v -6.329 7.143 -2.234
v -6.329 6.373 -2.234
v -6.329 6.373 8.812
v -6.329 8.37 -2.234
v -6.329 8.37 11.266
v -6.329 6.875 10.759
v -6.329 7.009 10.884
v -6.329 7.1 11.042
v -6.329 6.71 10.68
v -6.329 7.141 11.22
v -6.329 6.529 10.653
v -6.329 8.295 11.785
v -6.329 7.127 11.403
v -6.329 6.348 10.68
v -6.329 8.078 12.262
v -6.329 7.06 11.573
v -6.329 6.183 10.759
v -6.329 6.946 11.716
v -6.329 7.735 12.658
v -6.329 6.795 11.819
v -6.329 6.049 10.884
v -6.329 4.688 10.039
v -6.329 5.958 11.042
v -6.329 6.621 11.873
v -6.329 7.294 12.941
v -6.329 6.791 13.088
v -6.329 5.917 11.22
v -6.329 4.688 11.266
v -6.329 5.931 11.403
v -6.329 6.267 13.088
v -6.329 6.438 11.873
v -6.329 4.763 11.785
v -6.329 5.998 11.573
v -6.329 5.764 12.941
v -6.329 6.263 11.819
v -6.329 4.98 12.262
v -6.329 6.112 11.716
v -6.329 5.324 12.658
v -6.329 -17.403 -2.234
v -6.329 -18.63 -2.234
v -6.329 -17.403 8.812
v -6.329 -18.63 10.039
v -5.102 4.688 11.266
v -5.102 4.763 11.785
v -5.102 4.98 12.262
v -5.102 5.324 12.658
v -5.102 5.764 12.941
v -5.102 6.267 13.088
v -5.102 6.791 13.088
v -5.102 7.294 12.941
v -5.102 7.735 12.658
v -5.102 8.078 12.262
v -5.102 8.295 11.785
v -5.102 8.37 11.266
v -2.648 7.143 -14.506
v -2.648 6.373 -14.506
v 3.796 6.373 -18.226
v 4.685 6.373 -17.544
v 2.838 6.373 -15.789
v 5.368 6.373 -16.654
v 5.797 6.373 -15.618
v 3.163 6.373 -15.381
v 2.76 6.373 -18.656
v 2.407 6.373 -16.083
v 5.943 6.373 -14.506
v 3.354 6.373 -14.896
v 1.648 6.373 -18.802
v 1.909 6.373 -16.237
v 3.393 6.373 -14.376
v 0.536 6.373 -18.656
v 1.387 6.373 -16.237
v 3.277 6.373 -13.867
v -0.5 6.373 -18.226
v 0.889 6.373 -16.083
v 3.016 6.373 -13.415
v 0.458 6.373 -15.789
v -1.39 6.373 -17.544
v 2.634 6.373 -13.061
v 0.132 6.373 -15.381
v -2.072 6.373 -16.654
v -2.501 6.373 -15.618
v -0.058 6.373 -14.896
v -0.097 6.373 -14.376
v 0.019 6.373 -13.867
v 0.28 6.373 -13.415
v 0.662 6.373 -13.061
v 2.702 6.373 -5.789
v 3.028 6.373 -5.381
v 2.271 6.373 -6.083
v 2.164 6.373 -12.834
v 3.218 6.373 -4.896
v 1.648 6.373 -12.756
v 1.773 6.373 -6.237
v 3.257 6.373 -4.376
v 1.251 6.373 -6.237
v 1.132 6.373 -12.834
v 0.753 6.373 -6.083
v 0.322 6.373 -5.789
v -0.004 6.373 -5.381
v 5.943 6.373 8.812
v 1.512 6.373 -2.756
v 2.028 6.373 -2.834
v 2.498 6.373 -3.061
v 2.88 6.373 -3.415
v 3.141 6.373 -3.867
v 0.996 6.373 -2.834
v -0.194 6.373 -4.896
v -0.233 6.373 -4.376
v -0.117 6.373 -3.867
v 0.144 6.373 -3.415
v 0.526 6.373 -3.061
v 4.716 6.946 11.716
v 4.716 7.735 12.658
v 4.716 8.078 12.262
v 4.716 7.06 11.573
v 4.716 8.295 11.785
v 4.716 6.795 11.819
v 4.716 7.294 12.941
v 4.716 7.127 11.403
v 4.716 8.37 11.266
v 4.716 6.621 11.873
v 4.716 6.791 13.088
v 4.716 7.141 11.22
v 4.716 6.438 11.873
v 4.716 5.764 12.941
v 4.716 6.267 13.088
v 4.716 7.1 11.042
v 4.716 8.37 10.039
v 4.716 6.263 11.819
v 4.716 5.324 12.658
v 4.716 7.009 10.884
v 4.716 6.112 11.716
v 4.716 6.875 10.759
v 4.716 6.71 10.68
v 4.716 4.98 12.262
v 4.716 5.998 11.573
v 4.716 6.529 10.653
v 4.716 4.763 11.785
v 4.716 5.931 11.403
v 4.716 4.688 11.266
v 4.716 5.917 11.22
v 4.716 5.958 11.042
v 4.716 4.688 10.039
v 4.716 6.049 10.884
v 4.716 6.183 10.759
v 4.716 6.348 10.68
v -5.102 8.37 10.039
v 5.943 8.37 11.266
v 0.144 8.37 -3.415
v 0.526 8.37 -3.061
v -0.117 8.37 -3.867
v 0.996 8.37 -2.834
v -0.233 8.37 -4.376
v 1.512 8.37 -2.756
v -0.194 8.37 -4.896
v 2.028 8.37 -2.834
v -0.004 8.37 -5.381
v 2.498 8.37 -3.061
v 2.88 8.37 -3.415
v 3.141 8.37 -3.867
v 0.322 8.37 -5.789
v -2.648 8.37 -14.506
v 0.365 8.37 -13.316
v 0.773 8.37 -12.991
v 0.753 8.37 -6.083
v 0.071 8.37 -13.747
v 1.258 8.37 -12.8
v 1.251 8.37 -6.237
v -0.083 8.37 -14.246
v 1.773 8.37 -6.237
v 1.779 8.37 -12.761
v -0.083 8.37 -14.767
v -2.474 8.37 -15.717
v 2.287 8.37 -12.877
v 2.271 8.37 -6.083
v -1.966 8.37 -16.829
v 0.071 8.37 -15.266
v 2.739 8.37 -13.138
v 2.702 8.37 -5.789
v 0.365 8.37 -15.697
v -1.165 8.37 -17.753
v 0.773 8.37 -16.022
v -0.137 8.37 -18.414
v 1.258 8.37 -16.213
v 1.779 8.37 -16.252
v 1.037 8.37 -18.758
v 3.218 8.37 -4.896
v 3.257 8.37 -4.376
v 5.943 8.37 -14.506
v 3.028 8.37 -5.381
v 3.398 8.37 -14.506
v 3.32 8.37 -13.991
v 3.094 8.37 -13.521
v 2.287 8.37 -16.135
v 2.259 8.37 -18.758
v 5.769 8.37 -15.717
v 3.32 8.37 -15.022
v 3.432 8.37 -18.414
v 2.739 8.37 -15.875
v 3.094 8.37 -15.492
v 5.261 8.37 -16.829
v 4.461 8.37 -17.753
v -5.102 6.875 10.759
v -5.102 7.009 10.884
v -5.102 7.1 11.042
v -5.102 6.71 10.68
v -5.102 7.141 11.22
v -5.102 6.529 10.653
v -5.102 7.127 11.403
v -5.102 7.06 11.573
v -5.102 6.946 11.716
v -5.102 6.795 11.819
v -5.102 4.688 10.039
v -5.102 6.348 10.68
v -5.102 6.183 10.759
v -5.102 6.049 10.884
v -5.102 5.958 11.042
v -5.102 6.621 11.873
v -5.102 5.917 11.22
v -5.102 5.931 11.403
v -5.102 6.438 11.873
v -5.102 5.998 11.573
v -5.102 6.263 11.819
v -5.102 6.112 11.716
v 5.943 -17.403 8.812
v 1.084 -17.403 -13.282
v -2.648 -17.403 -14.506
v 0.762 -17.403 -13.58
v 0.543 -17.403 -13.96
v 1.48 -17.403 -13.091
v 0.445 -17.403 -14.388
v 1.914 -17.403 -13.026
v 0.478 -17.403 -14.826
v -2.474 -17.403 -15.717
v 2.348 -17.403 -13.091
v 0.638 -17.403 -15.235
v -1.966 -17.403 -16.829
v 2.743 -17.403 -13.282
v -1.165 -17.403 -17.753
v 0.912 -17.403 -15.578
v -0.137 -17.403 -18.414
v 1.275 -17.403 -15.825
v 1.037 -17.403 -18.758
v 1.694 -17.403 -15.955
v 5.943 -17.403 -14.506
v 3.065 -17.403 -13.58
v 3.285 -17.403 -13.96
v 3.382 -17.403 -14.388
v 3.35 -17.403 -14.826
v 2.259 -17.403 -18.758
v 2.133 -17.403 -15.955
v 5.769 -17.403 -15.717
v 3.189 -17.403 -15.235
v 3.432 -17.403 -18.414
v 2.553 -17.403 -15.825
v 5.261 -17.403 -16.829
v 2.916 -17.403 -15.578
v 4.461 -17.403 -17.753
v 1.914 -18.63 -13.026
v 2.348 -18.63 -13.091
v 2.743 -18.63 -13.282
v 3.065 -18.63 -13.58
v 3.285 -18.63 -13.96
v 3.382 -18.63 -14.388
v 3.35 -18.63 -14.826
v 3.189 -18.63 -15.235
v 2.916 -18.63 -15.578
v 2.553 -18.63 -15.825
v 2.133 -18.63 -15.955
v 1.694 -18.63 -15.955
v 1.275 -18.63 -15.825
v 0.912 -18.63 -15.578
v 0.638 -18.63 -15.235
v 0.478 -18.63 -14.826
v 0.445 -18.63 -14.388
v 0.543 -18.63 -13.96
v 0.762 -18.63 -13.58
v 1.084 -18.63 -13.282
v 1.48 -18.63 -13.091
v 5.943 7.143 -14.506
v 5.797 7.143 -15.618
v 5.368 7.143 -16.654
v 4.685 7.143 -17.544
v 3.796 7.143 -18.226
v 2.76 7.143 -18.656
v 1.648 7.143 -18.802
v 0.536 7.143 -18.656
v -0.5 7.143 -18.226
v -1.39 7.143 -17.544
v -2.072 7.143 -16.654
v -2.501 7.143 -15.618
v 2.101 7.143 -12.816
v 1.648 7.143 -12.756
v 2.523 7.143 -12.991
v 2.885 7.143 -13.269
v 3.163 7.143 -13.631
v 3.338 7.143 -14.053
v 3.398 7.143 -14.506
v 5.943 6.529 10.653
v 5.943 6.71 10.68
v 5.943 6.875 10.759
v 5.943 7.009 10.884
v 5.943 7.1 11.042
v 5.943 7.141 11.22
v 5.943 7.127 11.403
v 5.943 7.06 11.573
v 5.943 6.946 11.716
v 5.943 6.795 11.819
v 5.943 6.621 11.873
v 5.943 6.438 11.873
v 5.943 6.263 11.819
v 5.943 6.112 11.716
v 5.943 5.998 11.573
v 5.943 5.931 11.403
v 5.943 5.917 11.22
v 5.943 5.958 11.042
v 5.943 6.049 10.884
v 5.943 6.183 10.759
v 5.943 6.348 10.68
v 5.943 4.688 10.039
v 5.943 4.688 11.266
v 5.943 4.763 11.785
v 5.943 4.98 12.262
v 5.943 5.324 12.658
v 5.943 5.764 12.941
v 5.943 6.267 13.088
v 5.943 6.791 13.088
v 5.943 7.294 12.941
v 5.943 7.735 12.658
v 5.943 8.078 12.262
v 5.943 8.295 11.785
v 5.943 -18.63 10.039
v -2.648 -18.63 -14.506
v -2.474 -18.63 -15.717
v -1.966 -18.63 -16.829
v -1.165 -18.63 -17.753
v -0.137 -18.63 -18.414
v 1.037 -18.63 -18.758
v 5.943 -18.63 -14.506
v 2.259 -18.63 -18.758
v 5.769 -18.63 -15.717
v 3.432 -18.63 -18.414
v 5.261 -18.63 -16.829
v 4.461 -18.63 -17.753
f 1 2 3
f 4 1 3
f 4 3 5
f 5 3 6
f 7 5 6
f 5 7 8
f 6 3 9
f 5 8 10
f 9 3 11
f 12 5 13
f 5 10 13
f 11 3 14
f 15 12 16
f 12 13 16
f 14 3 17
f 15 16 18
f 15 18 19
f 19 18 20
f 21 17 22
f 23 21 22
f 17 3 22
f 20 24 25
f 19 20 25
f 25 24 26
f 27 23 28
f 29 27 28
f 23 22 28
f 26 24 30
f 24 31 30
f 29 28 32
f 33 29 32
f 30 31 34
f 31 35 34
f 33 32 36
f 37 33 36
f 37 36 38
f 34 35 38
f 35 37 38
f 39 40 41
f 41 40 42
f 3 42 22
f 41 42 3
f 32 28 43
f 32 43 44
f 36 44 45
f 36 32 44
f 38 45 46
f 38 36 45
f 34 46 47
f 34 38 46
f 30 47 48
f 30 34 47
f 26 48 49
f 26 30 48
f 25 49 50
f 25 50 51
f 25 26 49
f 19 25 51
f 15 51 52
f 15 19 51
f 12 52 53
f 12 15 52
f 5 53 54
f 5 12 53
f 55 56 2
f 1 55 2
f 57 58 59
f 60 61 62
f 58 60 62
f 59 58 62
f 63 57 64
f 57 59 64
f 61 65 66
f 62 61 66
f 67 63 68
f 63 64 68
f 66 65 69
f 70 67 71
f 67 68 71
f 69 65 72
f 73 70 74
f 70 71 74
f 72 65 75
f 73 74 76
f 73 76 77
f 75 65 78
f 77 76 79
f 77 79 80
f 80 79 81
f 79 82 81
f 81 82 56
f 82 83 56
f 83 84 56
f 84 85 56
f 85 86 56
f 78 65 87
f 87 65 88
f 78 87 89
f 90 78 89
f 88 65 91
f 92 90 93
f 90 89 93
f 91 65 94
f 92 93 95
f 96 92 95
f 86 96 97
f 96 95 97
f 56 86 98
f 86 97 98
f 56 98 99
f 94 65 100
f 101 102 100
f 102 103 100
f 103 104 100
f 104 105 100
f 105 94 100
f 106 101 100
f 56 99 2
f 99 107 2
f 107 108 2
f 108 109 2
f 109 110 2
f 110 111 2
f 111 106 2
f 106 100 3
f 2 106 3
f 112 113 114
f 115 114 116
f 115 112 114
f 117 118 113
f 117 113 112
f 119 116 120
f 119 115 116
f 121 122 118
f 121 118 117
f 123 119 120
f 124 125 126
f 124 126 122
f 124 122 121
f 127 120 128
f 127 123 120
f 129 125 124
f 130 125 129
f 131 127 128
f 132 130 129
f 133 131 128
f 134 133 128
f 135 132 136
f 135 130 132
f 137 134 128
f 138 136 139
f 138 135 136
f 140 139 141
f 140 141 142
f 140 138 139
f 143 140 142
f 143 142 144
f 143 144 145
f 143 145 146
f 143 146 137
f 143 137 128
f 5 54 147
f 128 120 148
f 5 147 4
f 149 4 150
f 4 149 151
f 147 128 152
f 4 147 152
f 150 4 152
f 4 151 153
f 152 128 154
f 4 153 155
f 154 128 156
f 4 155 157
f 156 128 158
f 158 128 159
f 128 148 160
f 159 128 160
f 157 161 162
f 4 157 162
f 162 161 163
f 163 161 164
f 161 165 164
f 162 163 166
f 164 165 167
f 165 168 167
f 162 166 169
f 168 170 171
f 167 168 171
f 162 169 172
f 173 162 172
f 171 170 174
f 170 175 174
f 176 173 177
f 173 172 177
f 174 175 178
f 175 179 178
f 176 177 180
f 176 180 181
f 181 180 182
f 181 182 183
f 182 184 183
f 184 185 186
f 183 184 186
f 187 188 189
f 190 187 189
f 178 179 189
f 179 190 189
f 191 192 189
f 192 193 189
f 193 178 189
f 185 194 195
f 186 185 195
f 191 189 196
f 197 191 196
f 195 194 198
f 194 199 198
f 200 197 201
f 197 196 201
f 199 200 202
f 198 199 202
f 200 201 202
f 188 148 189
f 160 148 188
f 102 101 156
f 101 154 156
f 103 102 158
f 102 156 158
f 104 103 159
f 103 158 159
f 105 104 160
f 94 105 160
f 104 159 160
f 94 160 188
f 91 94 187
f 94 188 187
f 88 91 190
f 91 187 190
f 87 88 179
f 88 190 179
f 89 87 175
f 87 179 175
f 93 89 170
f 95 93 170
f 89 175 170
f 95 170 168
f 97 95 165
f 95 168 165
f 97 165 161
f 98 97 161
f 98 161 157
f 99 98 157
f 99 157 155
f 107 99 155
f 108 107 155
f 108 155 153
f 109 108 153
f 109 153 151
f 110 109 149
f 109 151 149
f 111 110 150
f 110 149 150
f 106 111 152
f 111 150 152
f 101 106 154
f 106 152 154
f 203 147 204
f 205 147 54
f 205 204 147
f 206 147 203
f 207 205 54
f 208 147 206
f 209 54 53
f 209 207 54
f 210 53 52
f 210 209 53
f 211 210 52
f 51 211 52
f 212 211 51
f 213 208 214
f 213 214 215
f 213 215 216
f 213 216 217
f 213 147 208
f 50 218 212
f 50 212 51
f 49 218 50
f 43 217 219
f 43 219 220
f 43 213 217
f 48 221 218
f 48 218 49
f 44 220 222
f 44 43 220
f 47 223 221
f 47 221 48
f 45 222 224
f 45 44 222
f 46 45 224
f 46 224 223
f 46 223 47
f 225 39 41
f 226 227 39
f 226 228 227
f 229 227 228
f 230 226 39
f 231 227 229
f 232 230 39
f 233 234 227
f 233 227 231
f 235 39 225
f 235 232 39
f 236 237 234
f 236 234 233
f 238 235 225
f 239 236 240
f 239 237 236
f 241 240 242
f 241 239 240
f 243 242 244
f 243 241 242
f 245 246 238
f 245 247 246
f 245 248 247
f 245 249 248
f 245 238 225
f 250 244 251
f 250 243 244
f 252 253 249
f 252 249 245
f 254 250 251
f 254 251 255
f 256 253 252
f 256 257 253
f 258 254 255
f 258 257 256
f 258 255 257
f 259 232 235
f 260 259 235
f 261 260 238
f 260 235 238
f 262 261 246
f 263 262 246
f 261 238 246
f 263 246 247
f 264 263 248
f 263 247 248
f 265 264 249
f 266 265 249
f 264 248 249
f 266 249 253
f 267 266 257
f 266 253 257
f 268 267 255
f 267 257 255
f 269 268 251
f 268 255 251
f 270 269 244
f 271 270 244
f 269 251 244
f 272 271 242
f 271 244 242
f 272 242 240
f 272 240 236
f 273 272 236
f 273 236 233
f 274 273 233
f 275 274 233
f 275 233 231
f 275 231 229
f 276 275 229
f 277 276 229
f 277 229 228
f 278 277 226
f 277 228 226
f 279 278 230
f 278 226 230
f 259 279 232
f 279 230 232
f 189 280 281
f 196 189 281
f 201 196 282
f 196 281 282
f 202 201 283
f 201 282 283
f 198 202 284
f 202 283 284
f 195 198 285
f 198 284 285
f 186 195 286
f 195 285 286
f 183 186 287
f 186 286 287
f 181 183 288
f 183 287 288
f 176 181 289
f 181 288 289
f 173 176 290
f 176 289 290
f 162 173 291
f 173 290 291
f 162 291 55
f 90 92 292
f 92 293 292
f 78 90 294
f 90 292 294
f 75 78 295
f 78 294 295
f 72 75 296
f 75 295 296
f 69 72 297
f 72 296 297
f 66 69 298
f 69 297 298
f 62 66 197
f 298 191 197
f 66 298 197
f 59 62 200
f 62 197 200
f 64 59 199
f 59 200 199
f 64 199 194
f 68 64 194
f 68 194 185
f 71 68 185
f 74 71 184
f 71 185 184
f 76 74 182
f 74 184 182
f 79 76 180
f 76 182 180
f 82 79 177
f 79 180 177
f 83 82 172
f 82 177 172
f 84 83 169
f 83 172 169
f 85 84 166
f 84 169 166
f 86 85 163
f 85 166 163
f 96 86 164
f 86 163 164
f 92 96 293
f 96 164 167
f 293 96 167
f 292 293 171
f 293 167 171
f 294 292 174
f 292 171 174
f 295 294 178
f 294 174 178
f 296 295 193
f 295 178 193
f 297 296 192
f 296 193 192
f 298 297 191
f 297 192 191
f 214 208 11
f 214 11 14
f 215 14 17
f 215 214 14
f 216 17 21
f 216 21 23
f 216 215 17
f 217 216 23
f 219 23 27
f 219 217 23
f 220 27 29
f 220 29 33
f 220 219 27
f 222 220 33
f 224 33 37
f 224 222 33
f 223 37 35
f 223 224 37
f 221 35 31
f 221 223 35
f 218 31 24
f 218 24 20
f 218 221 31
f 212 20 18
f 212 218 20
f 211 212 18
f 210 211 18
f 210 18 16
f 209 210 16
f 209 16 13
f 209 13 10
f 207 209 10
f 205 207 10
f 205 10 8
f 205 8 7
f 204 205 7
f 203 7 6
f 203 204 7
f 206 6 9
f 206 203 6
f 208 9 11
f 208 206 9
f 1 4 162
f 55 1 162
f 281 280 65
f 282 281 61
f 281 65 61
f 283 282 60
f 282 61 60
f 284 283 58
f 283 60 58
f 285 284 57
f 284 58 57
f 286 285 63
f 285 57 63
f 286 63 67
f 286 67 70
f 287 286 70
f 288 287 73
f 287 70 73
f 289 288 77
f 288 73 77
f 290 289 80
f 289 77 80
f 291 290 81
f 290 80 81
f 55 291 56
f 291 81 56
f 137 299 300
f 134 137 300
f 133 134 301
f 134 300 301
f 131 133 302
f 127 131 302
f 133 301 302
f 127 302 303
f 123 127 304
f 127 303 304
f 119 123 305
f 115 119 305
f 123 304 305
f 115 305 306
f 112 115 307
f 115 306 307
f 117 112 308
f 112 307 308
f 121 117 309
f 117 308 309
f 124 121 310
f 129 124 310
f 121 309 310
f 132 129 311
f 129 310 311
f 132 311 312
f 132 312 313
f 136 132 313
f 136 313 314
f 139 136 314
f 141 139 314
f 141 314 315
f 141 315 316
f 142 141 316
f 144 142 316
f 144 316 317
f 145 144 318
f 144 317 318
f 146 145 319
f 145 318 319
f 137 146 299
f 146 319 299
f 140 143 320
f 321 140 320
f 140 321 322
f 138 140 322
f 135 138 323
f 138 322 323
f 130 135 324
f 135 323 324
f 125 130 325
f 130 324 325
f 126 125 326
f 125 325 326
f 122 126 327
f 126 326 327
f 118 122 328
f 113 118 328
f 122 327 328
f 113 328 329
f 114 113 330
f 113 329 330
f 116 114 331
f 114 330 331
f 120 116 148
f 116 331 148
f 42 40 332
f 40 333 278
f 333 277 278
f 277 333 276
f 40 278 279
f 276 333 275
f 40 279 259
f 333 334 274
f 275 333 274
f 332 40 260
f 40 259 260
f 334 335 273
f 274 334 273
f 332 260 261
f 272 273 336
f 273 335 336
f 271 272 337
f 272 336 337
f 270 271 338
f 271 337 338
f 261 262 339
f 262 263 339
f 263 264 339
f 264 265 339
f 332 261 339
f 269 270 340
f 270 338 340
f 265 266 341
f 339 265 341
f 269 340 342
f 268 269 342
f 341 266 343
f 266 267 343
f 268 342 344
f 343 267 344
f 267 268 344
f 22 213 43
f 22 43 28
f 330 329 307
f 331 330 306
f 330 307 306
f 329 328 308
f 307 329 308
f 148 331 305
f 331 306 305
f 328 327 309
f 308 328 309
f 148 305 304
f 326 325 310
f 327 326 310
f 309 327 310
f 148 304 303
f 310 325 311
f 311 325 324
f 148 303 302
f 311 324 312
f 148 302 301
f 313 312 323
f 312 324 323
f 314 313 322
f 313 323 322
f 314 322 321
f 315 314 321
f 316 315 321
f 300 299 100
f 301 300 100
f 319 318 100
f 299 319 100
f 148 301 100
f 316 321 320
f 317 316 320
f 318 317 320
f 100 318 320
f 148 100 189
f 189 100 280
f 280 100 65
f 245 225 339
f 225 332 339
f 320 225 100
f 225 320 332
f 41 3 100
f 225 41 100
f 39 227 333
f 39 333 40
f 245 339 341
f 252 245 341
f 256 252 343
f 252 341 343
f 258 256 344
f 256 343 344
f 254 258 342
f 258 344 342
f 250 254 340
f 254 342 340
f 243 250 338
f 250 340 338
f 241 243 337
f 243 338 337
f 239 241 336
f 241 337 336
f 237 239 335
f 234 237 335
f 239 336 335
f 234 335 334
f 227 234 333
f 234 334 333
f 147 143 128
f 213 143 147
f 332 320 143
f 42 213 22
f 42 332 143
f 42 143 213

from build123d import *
from build123d.topology import SkipClean

# Parameters (mm, degrees)
SKETCH_2_W           = 5
SKETCH_2_H           = 10
EXTRUDE_1_DEPTH      = 0.5
CUT_EXTRUDE_1_DEPTH  = 1.5
EXTRUDE_3_DEPTH      = 0.5
SKETCH_8_R           = 0.6
CUT_EXTRUDE_2_DEPTH  = 0.5
SKETCH_12_W          = 5
SKETCH_12_H          = 0.5
EXTRUDE_4_DEPTH      = 10.5
SKETCH_14_W          = 5
SKETCH_14_H          = 0.5
EXTRUDE_5_DEPTH      = 10
SKETCH_16_W          = 5
SKETCH_16_H          = 0.5
CUT_EXTRUDE_3_DEPTH  = 10
CUT_EXTRUDE_4_DEPTH  = 10
EXTRUDE_START        = -0.5
EXTRUDE_6_DEPTH      = 0.5
SKETCH_19_R          = 0.6
CUT_EXTRUDE_5_DEPTH  = 0.5
SKETCH_23_W          = 0.5
SKETCH_23_H          = 1.5
EXTRUDE_7_DEPTH      = 0.5
EXTRUDE_9_DEPTH      = 0.5
SKETCH_25_R          = 0.25
CUT_EXTRUDE_6_DEPTH  = 0.5
CUT_EXTRUDE_START    = -0.5
SKETCH_28_R          = 0.25
CUT_EXTRUDE_7_DEPTH  = 0.5
SCALE_1_SCALE        = 3.181818182
SCALE_2_SCALE        = 0.771428571
CUT_EXTRUDE_8_DEPTH  = 10
SKETCH_30_R          = 1.75
CUT_EXTRUDE_9_DEPTH  = 10
EXTRUDE_10_DEPTH     = 3
SKETCH_37_R          = 4.295454545
EXTRUDE_11_DEPTH     = 3
CUT_EXTRUDE_START_2  = -3
SKETCH_38_R          = 1.75
CUT_EXTRUDE_10_DEPTH = 3
SKETCH_39_R          = 1.75
CUT_EXTRUDE_11_DEPTH = 3
SKETCH_41_W          = 46.80206249
SKETCH_41_H          = 2.589600393
CUT_EXTRUDE_13_DEPTH = 30.175477213
SKETCH_42_W          = 32.065343688
SKETCH_42_H          = 1.095167369
CUT_EXTRUDE_14_DEPTH = 30.175477212
EXTRUDE_START_2      = 0.77
EXTRUDE_12_DEPTH     = 0.77
CUT_EXTRUDE_15_REACH = 34.524
SKETCH_44_R          = 1.75


with BuildPart() as part:
    # 草图2 → 凸台-拉伸1 (new body)
    with BuildSketch(Plane(origin=(0, 0, 0), x_dir=(1, 0, 0), z_dir=(0, 1, 0))):
        Rectangle(SKETCH_2_W, SKETCH_2_H)
    extrude(amount=EXTRUDE_1_DEPTH)

    # 草图3 → 切除-拉伸1 (cut)
    with BuildSketch(Plane(origin=(0, 0.5, 0), x_dir=(1, 0, 0), z_dir=(0, 1, 0))):
        Polygon((-2.5, 0), (-1, 5), (-4.597388324, 7.155522044), (-6.097388324, 2.155522044), align=None)
    extrude(amount=-CUT_EXTRUDE_1_DEPTH, mode=Mode.SUBTRACT)

    # 草图6 → 凸台-拉伸3 (add)
    with BuildSketch(Plane.XZ):
        with BuildLine():
            Line((-1, -5), (2.5, -5))
            ThreePointArc((2.5, -5), (0.75, -6.75), (-1, -5))
        make_face()
    extrude(amount=-EXTRUDE_3_DEPTH)

    # 草图8 → 切除-拉伸2 (cut)
    with BuildSketch(Plane(origin=(0, 0.5, 0), x_dir=(1, 0, 0), z_dir=(0, 1, 0))):
        with Locations(Location((0.858368729, 4.996789463, 0), (0, 0, 270))):
            Circle(SKETCH_8_R)
    extrude(amount=-CUT_EXTRUDE_2_DEPTH, mode=Mode.SUBTRACT)

    # 草图12 → 凸台-拉伸4 (add)
    with BuildSketch(Plane.XZ):
        with Locations((0, 4.75)):
            Rectangle(SKETCH_12_W, SKETCH_12_H)
    extrude(amount=EXTRUDE_4_DEPTH)

    # 草图14 → 凸台-拉伸5 (add)
    with BuildSketch(Plane(origin=(0, 0, 4.5), x_dir=(-1, 0, 0), z_dir=(0, 0, -1))):
        with Locations((0, -10.25)):
            Rectangle(SKETCH_14_W, SKETCH_14_H)
    extrude(amount=EXTRUDE_5_DEPTH)

    # 草图16 → 切除-拉伸3 (cut)
    with BuildSketch(Plane(origin=(0, -10, 0), x_dir=(1, 0, 0), z_dir=(0, 1, 0))):
        with Locations((0, 5.25)):
            Rectangle(SKETCH_16_W, SKETCH_16_H)
    extrude(amount=-CUT_EXTRUDE_3_DEPTH, mode=Mode.SUBTRACT)

    # 草图17 → 切除-拉伸4 (cut)
    with BuildSketch(Plane(origin=(0, -10, 0), x_dir=(1, 0, 0), z_dir=(0, 1, 0))):
        Polygon((-1, 5), (-2.5, 0), (-4.860653069, 1.950314005), (-3.360653069, 6.950314005), align=None)
    extrude(amount=-CUT_EXTRUDE_4_DEPTH, mode=Mode.SUBTRACT)

    # 草图18 → 凸台-拉伸6 (add)
    with BuildSketch(Plane(origin=(0, -10, 0), x_dir=(1, 0, 0), z_dir=(0, 1, 0)).offset(EXTRUDE_START)):
        with BuildLine():
            Line((-1, 5), (2.5, 5))
            ThreePointArc((2.5, 5), (0.75, 6.75), (-1, 5))
        make_face()
    extrude(amount=EXTRUDE_6_DEPTH)

    # 草图19 → 切除-拉伸5 (cut)
    with BuildSketch(Plane(origin=(0, -10, 0), x_dir=(1, 0, 0), z_dir=(0, 1, 0))):
        with Locations(Location((0.858368729, 4.996789463, 0), (0, 0, 270))):
            Circle(SKETCH_19_R)
    extrude(amount=-CUT_EXTRUDE_5_DEPTH, mode=Mode.SUBTRACT)

    # 草图23 → 凸台-拉伸7 (add)
    with BuildSketch(Plane.XY.offset(5)):
        with Locations((2.25, -0.25)):
            Rectangle(SKETCH_23_W, SKETCH_23_H)
    extrude_7 = extrude(amount=EXTRUDE_7_DEPTH)

    # 草图24 → 凸台-拉伸9 (add)
    with BuildSketch(Plane(origin=(2.5, 0, 0), x_dir=(0, 0, -1), z_dir=(1, 0, 0))):
        with BuildLine():
            Line((-5.5, 0.5), (-5.5, -1))
            ThreePointArc((-5.5, -1), (-6.25, -0.25), (-5.5, 0.5))
        make_face()
    extrude_9 = extrude(amount=-EXTRUDE_9_DEPTH)

    # 草图25 → 切除-拉伸6 (cut)
    with BuildSketch(Plane(origin=(2.5, 0, 0), x_dir=(0, 0, -1), z_dir=(1, 0, 0))):
        with Locations((-5.5, -0.25)):
            Circle(SKETCH_25_R)
    extrude(amount=-CUT_EXTRUDE_6_DEPTH, mode=Mode.SUBTRACT)

    # 镜向1: 凸台-拉伸7, 凸台-拉伸9 across plane
    add(extrude_7.mirror(Plane(origin=(0, 0, 0), x_dir=(0, 0, 1), z_dir=(1, 0, 0))))
    add(extrude_9.mirror(Plane(origin=(0, 0, 0), x_dir=(0, 0, 1), z_dir=(1, 0, 0))))

    # 草图28 → 切除-拉伸7 (cut)
    with BuildSketch(Plane.ZY.offset(2.5).offset(CUT_EXTRUDE_START)):
        with Locations(Location((5.5, -0.25, 0), (0, 0, 180))):
            Circle(SKETCH_28_R)
    extrude(amount=CUT_EXTRUDE_7_DEPTH, mode=Mode.SUBTRACT)


with BuildPart() as part_1:
    # 缩放比例1: scaled about (0.132742616, -4.910605003, 1.535666779)
    add(part.part.scale(SCALE_1_SCALE).moved(Location((-0.289620253, 10.714047279, -3.3505457))))


with BuildPart() as part_2:
    # 缩放比例2: scaled about (0.132742617, -4.910605002, 1.53566678)
    add(part_1.part.scale(SCALE_2_SCALE).moved(Location((0.03034117, -1.122424, 0.35100955))))

    # 草图29 → 切除-拉伸8 (cut)
    with BuildSketch(Plane(origin=(0, 8.369970913, 0), x_dir=(1, 0, 0), z_dir=(0, 1, 0))):
        with BuildLine():
            ThreePointArc((3.397828922, 14.506424406), (1.647828922, 16.256424406), (-0.102171078, 14.506424406))
            Line((-0.102171078, 14.506424406), (0.441118704, 14.506424406))
            ThreePointArc((0.441118704, 14.506424406), (1.913824893, 15.97127127), (3.386531082, 14.506424406))
            Line((3.386531082, 14.506424406), (3.397828922, 14.506424406))
        make_face()
        with BuildLine():
            Line((0.441118704, 14.506424406), (-0.102171078, 14.506424406))
            ThreePointArc((-0.102171078, 14.506424406), (1.647828922, 12.756424406), (3.397828922, 14.506424406))
            Line((3.397828922, 14.506424406), (3.386531082, 14.506424406))
            ThreePointArc((3.386531082, 14.506424406), (3.386546895, 14.502484216), (3.386552166, 14.498543997))
            ThreePointArc((3.386552166, 14.498543997), (1.909884674, 13.025821995), (0.441118704, 14.506424406))
        make_face()
    extrude(amount=-CUT_EXTRUDE_8_DEPTH, mode=Mode.SUBTRACT)

    # 草图30 → 切除-拉伸9 (cut)
    with BuildSketch(Plane(origin=(0, 8.369970913, 0), x_dir=(1, 0, 0), z_dir=(0, 1, 0))):
        with Locations(Location((1.511995488, 4.506424406, 0), (0, 0, 270))):
            Circle(SKETCH_30_R)
    extrude(amount=-CUT_EXTRUDE_9_DEPTH, mode=Mode.SUBTRACT)

    # 草图33 → 凸台-拉伸10 (add)
    with BuildSketch(Plane(origin=(0, 8.369970913, 0), x_dir=(1, 0, 0), z_dir=(0, 1, 0))):
        Polygon((-5.102171078, -10.039030139), (-5.102171078, -11.266302866), (-6.329443805, -11.266302866), (-6.329443805, 2.233697134), (-2.647625624, 14.506424406), (5.943283467, 14.506424406), (5.943283467, -11.266302866), (4.71601074, -11.266302866), (4.71601074, -10.039030139), align=None)
    extrude(amount=EXTRUDE_10_DEPTH)

    # 草图37 → 凸台-拉伸11 (add)
    with BuildSketch(Plane(origin=(0, 8.369970913, 0), x_dir=(1, 0, 0), z_dir=(0, 1, 0))):
        with Locations((1.647828922, 14.506424406)):
            Circle(SKETCH_37_R)
    extrude(amount=EXTRUDE_11_DEPTH)

    # 草图38 → 切除-拉伸10 (cut)
    with SkipClean():  # the faces are left unmerged after this step: merging them gives an invalid solid
        with BuildSketch(Plane(origin=(0, 8.369970913, 0), x_dir=(-1, 0, 0), z_dir=(0, -1, 0)).offset(CUT_EXTRUDE_START_2)):
            with Locations(Location((-1.647828922, 14.506424406, 0), (0, 0, 270))):
                Circle(SKETCH_38_R)
        extrude(amount=CUT_EXTRUDE_10_DEPTH, mode=Mode.SUBTRACT)

    # 草图39 → 切除-拉伸11 (cut)
    with BuildSketch(Plane(origin=(0, 8.369970913, 0), x_dir=(-1, 0, 0), z_dir=(0, -1, 0)).offset(CUT_EXTRUDE_START_2)):
        with Locations(Location((-1.511995488, 4.506424406, 0), (0, 0, 270))):
            Circle(SKETCH_39_R)
    extrude(amount=CUT_EXTRUDE_11_DEPTH, mode=Mode.SUBTRACT)

    # 草图41 → 切除-拉伸13 (cut, through all)
    with BuildSketch(Plane(origin=(5.943283467, 0, 0), x_dir=(0, 0, -1), z_dir=(1, 0, 0))):
        with Locations((1.937836064, 10.437498382)):
            Rectangle(SKETCH_41_W, SKETCH_41_H)
    extrude(amount=-CUT_EXTRUDE_13_DEPTH, mode=Mode.SUBTRACT)

    # 草图42 → 切除-拉伸14 (cut, through all)
    with BuildSketch(Plane(origin=(5.943283467, 0, 0), x_dir=(0, 0, -1), z_dir=(1, 0, 0))):
        with Locations((4.766368978, 8.917554598)):
            Rectangle(SKETCH_42_W, SKETCH_42_H)
    extrude(amount=-CUT_EXTRUDE_14_DEPTH, mode=Mode.SUBTRACT)

    # 草图43 → 凸台-拉伸12 (add)
    with BuildSketch(Plane.XZ.offset(-7.142698186).offset(EXTRUDE_START_2)):
        with BuildLine():
            Line((-6.329443805, 8.811757412), (5.943283467, 8.811757412))
            Line((5.943283467, 8.811757412), (5.943283467, -14.506424406))
            ThreePointArc((5.943283467, -14.506424406), (4.685173959, -17.543769444), (1.647828922, -18.801878952))
            ThreePointArc((1.647828922, -18.801878952), (-1.389516115, -17.543769444), (-2.647625624, -14.506424406))
            Line((-2.647625624, -14.506424406), (-6.329443805, -2.233697134))
            Line((-6.329443805, -2.233697134), (-6.329443805, 8.811757412))
        make_face()
    extrude(amount=-EXTRUDE_12_DEPTH)

    # 草图44 → 切除-拉伸15 (cut, up to next)
    with BuildSketch(Plane(origin=(0, 7.142698186, 0), x_dir=(1, 0, 0), z_dir=(0, 1, 0)), mode=Mode.PRIVATE) as cut_extrude_15_sk1:
        with Locations(Location((1.511995488, 4.506424406, 0), (0, 0, 270))):
            Circle(SKETCH_44_R)
    cut_extrude_15_tool1 = extrude(cut_extrude_15_sk1.sketch, amount=-CUT_EXTRUDE_15_REACH, mode=Mode.PRIVATE) & part_2.part
    # 草图44 → 切除-拉伸15 (cut, up to next)
    with BuildSketch(Plane(origin=(0, 7.142698186, 0), x_dir=(1, 0, 0), z_dir=(0, 1, 0)), mode=Mode.PRIVATE) as cut_extrude_15_sk2:
        with Locations(Location((1.647828922, 14.506424406, 0), (0, 0, 270))):
            Circle(SKETCH_44_R)
    cut_extrude_15_tool2 = extrude(cut_extrude_15_sk2.sketch, amount=-CUT_EXTRUDE_15_REACH, mode=Mode.PRIVATE) & part_2.part
    add(cut_extrude_15_tool1.solids().sort_by_distance((1.511995, 7.142698, -4.506424))[0], mode=Mode.SUBTRACT)
    add(cut_extrude_15_tool2.solids().sort_by_distance((1.647829, 7.142698, -14.506424))[0], mode=Mode.SUBTRACT)


solid = part_2.part
